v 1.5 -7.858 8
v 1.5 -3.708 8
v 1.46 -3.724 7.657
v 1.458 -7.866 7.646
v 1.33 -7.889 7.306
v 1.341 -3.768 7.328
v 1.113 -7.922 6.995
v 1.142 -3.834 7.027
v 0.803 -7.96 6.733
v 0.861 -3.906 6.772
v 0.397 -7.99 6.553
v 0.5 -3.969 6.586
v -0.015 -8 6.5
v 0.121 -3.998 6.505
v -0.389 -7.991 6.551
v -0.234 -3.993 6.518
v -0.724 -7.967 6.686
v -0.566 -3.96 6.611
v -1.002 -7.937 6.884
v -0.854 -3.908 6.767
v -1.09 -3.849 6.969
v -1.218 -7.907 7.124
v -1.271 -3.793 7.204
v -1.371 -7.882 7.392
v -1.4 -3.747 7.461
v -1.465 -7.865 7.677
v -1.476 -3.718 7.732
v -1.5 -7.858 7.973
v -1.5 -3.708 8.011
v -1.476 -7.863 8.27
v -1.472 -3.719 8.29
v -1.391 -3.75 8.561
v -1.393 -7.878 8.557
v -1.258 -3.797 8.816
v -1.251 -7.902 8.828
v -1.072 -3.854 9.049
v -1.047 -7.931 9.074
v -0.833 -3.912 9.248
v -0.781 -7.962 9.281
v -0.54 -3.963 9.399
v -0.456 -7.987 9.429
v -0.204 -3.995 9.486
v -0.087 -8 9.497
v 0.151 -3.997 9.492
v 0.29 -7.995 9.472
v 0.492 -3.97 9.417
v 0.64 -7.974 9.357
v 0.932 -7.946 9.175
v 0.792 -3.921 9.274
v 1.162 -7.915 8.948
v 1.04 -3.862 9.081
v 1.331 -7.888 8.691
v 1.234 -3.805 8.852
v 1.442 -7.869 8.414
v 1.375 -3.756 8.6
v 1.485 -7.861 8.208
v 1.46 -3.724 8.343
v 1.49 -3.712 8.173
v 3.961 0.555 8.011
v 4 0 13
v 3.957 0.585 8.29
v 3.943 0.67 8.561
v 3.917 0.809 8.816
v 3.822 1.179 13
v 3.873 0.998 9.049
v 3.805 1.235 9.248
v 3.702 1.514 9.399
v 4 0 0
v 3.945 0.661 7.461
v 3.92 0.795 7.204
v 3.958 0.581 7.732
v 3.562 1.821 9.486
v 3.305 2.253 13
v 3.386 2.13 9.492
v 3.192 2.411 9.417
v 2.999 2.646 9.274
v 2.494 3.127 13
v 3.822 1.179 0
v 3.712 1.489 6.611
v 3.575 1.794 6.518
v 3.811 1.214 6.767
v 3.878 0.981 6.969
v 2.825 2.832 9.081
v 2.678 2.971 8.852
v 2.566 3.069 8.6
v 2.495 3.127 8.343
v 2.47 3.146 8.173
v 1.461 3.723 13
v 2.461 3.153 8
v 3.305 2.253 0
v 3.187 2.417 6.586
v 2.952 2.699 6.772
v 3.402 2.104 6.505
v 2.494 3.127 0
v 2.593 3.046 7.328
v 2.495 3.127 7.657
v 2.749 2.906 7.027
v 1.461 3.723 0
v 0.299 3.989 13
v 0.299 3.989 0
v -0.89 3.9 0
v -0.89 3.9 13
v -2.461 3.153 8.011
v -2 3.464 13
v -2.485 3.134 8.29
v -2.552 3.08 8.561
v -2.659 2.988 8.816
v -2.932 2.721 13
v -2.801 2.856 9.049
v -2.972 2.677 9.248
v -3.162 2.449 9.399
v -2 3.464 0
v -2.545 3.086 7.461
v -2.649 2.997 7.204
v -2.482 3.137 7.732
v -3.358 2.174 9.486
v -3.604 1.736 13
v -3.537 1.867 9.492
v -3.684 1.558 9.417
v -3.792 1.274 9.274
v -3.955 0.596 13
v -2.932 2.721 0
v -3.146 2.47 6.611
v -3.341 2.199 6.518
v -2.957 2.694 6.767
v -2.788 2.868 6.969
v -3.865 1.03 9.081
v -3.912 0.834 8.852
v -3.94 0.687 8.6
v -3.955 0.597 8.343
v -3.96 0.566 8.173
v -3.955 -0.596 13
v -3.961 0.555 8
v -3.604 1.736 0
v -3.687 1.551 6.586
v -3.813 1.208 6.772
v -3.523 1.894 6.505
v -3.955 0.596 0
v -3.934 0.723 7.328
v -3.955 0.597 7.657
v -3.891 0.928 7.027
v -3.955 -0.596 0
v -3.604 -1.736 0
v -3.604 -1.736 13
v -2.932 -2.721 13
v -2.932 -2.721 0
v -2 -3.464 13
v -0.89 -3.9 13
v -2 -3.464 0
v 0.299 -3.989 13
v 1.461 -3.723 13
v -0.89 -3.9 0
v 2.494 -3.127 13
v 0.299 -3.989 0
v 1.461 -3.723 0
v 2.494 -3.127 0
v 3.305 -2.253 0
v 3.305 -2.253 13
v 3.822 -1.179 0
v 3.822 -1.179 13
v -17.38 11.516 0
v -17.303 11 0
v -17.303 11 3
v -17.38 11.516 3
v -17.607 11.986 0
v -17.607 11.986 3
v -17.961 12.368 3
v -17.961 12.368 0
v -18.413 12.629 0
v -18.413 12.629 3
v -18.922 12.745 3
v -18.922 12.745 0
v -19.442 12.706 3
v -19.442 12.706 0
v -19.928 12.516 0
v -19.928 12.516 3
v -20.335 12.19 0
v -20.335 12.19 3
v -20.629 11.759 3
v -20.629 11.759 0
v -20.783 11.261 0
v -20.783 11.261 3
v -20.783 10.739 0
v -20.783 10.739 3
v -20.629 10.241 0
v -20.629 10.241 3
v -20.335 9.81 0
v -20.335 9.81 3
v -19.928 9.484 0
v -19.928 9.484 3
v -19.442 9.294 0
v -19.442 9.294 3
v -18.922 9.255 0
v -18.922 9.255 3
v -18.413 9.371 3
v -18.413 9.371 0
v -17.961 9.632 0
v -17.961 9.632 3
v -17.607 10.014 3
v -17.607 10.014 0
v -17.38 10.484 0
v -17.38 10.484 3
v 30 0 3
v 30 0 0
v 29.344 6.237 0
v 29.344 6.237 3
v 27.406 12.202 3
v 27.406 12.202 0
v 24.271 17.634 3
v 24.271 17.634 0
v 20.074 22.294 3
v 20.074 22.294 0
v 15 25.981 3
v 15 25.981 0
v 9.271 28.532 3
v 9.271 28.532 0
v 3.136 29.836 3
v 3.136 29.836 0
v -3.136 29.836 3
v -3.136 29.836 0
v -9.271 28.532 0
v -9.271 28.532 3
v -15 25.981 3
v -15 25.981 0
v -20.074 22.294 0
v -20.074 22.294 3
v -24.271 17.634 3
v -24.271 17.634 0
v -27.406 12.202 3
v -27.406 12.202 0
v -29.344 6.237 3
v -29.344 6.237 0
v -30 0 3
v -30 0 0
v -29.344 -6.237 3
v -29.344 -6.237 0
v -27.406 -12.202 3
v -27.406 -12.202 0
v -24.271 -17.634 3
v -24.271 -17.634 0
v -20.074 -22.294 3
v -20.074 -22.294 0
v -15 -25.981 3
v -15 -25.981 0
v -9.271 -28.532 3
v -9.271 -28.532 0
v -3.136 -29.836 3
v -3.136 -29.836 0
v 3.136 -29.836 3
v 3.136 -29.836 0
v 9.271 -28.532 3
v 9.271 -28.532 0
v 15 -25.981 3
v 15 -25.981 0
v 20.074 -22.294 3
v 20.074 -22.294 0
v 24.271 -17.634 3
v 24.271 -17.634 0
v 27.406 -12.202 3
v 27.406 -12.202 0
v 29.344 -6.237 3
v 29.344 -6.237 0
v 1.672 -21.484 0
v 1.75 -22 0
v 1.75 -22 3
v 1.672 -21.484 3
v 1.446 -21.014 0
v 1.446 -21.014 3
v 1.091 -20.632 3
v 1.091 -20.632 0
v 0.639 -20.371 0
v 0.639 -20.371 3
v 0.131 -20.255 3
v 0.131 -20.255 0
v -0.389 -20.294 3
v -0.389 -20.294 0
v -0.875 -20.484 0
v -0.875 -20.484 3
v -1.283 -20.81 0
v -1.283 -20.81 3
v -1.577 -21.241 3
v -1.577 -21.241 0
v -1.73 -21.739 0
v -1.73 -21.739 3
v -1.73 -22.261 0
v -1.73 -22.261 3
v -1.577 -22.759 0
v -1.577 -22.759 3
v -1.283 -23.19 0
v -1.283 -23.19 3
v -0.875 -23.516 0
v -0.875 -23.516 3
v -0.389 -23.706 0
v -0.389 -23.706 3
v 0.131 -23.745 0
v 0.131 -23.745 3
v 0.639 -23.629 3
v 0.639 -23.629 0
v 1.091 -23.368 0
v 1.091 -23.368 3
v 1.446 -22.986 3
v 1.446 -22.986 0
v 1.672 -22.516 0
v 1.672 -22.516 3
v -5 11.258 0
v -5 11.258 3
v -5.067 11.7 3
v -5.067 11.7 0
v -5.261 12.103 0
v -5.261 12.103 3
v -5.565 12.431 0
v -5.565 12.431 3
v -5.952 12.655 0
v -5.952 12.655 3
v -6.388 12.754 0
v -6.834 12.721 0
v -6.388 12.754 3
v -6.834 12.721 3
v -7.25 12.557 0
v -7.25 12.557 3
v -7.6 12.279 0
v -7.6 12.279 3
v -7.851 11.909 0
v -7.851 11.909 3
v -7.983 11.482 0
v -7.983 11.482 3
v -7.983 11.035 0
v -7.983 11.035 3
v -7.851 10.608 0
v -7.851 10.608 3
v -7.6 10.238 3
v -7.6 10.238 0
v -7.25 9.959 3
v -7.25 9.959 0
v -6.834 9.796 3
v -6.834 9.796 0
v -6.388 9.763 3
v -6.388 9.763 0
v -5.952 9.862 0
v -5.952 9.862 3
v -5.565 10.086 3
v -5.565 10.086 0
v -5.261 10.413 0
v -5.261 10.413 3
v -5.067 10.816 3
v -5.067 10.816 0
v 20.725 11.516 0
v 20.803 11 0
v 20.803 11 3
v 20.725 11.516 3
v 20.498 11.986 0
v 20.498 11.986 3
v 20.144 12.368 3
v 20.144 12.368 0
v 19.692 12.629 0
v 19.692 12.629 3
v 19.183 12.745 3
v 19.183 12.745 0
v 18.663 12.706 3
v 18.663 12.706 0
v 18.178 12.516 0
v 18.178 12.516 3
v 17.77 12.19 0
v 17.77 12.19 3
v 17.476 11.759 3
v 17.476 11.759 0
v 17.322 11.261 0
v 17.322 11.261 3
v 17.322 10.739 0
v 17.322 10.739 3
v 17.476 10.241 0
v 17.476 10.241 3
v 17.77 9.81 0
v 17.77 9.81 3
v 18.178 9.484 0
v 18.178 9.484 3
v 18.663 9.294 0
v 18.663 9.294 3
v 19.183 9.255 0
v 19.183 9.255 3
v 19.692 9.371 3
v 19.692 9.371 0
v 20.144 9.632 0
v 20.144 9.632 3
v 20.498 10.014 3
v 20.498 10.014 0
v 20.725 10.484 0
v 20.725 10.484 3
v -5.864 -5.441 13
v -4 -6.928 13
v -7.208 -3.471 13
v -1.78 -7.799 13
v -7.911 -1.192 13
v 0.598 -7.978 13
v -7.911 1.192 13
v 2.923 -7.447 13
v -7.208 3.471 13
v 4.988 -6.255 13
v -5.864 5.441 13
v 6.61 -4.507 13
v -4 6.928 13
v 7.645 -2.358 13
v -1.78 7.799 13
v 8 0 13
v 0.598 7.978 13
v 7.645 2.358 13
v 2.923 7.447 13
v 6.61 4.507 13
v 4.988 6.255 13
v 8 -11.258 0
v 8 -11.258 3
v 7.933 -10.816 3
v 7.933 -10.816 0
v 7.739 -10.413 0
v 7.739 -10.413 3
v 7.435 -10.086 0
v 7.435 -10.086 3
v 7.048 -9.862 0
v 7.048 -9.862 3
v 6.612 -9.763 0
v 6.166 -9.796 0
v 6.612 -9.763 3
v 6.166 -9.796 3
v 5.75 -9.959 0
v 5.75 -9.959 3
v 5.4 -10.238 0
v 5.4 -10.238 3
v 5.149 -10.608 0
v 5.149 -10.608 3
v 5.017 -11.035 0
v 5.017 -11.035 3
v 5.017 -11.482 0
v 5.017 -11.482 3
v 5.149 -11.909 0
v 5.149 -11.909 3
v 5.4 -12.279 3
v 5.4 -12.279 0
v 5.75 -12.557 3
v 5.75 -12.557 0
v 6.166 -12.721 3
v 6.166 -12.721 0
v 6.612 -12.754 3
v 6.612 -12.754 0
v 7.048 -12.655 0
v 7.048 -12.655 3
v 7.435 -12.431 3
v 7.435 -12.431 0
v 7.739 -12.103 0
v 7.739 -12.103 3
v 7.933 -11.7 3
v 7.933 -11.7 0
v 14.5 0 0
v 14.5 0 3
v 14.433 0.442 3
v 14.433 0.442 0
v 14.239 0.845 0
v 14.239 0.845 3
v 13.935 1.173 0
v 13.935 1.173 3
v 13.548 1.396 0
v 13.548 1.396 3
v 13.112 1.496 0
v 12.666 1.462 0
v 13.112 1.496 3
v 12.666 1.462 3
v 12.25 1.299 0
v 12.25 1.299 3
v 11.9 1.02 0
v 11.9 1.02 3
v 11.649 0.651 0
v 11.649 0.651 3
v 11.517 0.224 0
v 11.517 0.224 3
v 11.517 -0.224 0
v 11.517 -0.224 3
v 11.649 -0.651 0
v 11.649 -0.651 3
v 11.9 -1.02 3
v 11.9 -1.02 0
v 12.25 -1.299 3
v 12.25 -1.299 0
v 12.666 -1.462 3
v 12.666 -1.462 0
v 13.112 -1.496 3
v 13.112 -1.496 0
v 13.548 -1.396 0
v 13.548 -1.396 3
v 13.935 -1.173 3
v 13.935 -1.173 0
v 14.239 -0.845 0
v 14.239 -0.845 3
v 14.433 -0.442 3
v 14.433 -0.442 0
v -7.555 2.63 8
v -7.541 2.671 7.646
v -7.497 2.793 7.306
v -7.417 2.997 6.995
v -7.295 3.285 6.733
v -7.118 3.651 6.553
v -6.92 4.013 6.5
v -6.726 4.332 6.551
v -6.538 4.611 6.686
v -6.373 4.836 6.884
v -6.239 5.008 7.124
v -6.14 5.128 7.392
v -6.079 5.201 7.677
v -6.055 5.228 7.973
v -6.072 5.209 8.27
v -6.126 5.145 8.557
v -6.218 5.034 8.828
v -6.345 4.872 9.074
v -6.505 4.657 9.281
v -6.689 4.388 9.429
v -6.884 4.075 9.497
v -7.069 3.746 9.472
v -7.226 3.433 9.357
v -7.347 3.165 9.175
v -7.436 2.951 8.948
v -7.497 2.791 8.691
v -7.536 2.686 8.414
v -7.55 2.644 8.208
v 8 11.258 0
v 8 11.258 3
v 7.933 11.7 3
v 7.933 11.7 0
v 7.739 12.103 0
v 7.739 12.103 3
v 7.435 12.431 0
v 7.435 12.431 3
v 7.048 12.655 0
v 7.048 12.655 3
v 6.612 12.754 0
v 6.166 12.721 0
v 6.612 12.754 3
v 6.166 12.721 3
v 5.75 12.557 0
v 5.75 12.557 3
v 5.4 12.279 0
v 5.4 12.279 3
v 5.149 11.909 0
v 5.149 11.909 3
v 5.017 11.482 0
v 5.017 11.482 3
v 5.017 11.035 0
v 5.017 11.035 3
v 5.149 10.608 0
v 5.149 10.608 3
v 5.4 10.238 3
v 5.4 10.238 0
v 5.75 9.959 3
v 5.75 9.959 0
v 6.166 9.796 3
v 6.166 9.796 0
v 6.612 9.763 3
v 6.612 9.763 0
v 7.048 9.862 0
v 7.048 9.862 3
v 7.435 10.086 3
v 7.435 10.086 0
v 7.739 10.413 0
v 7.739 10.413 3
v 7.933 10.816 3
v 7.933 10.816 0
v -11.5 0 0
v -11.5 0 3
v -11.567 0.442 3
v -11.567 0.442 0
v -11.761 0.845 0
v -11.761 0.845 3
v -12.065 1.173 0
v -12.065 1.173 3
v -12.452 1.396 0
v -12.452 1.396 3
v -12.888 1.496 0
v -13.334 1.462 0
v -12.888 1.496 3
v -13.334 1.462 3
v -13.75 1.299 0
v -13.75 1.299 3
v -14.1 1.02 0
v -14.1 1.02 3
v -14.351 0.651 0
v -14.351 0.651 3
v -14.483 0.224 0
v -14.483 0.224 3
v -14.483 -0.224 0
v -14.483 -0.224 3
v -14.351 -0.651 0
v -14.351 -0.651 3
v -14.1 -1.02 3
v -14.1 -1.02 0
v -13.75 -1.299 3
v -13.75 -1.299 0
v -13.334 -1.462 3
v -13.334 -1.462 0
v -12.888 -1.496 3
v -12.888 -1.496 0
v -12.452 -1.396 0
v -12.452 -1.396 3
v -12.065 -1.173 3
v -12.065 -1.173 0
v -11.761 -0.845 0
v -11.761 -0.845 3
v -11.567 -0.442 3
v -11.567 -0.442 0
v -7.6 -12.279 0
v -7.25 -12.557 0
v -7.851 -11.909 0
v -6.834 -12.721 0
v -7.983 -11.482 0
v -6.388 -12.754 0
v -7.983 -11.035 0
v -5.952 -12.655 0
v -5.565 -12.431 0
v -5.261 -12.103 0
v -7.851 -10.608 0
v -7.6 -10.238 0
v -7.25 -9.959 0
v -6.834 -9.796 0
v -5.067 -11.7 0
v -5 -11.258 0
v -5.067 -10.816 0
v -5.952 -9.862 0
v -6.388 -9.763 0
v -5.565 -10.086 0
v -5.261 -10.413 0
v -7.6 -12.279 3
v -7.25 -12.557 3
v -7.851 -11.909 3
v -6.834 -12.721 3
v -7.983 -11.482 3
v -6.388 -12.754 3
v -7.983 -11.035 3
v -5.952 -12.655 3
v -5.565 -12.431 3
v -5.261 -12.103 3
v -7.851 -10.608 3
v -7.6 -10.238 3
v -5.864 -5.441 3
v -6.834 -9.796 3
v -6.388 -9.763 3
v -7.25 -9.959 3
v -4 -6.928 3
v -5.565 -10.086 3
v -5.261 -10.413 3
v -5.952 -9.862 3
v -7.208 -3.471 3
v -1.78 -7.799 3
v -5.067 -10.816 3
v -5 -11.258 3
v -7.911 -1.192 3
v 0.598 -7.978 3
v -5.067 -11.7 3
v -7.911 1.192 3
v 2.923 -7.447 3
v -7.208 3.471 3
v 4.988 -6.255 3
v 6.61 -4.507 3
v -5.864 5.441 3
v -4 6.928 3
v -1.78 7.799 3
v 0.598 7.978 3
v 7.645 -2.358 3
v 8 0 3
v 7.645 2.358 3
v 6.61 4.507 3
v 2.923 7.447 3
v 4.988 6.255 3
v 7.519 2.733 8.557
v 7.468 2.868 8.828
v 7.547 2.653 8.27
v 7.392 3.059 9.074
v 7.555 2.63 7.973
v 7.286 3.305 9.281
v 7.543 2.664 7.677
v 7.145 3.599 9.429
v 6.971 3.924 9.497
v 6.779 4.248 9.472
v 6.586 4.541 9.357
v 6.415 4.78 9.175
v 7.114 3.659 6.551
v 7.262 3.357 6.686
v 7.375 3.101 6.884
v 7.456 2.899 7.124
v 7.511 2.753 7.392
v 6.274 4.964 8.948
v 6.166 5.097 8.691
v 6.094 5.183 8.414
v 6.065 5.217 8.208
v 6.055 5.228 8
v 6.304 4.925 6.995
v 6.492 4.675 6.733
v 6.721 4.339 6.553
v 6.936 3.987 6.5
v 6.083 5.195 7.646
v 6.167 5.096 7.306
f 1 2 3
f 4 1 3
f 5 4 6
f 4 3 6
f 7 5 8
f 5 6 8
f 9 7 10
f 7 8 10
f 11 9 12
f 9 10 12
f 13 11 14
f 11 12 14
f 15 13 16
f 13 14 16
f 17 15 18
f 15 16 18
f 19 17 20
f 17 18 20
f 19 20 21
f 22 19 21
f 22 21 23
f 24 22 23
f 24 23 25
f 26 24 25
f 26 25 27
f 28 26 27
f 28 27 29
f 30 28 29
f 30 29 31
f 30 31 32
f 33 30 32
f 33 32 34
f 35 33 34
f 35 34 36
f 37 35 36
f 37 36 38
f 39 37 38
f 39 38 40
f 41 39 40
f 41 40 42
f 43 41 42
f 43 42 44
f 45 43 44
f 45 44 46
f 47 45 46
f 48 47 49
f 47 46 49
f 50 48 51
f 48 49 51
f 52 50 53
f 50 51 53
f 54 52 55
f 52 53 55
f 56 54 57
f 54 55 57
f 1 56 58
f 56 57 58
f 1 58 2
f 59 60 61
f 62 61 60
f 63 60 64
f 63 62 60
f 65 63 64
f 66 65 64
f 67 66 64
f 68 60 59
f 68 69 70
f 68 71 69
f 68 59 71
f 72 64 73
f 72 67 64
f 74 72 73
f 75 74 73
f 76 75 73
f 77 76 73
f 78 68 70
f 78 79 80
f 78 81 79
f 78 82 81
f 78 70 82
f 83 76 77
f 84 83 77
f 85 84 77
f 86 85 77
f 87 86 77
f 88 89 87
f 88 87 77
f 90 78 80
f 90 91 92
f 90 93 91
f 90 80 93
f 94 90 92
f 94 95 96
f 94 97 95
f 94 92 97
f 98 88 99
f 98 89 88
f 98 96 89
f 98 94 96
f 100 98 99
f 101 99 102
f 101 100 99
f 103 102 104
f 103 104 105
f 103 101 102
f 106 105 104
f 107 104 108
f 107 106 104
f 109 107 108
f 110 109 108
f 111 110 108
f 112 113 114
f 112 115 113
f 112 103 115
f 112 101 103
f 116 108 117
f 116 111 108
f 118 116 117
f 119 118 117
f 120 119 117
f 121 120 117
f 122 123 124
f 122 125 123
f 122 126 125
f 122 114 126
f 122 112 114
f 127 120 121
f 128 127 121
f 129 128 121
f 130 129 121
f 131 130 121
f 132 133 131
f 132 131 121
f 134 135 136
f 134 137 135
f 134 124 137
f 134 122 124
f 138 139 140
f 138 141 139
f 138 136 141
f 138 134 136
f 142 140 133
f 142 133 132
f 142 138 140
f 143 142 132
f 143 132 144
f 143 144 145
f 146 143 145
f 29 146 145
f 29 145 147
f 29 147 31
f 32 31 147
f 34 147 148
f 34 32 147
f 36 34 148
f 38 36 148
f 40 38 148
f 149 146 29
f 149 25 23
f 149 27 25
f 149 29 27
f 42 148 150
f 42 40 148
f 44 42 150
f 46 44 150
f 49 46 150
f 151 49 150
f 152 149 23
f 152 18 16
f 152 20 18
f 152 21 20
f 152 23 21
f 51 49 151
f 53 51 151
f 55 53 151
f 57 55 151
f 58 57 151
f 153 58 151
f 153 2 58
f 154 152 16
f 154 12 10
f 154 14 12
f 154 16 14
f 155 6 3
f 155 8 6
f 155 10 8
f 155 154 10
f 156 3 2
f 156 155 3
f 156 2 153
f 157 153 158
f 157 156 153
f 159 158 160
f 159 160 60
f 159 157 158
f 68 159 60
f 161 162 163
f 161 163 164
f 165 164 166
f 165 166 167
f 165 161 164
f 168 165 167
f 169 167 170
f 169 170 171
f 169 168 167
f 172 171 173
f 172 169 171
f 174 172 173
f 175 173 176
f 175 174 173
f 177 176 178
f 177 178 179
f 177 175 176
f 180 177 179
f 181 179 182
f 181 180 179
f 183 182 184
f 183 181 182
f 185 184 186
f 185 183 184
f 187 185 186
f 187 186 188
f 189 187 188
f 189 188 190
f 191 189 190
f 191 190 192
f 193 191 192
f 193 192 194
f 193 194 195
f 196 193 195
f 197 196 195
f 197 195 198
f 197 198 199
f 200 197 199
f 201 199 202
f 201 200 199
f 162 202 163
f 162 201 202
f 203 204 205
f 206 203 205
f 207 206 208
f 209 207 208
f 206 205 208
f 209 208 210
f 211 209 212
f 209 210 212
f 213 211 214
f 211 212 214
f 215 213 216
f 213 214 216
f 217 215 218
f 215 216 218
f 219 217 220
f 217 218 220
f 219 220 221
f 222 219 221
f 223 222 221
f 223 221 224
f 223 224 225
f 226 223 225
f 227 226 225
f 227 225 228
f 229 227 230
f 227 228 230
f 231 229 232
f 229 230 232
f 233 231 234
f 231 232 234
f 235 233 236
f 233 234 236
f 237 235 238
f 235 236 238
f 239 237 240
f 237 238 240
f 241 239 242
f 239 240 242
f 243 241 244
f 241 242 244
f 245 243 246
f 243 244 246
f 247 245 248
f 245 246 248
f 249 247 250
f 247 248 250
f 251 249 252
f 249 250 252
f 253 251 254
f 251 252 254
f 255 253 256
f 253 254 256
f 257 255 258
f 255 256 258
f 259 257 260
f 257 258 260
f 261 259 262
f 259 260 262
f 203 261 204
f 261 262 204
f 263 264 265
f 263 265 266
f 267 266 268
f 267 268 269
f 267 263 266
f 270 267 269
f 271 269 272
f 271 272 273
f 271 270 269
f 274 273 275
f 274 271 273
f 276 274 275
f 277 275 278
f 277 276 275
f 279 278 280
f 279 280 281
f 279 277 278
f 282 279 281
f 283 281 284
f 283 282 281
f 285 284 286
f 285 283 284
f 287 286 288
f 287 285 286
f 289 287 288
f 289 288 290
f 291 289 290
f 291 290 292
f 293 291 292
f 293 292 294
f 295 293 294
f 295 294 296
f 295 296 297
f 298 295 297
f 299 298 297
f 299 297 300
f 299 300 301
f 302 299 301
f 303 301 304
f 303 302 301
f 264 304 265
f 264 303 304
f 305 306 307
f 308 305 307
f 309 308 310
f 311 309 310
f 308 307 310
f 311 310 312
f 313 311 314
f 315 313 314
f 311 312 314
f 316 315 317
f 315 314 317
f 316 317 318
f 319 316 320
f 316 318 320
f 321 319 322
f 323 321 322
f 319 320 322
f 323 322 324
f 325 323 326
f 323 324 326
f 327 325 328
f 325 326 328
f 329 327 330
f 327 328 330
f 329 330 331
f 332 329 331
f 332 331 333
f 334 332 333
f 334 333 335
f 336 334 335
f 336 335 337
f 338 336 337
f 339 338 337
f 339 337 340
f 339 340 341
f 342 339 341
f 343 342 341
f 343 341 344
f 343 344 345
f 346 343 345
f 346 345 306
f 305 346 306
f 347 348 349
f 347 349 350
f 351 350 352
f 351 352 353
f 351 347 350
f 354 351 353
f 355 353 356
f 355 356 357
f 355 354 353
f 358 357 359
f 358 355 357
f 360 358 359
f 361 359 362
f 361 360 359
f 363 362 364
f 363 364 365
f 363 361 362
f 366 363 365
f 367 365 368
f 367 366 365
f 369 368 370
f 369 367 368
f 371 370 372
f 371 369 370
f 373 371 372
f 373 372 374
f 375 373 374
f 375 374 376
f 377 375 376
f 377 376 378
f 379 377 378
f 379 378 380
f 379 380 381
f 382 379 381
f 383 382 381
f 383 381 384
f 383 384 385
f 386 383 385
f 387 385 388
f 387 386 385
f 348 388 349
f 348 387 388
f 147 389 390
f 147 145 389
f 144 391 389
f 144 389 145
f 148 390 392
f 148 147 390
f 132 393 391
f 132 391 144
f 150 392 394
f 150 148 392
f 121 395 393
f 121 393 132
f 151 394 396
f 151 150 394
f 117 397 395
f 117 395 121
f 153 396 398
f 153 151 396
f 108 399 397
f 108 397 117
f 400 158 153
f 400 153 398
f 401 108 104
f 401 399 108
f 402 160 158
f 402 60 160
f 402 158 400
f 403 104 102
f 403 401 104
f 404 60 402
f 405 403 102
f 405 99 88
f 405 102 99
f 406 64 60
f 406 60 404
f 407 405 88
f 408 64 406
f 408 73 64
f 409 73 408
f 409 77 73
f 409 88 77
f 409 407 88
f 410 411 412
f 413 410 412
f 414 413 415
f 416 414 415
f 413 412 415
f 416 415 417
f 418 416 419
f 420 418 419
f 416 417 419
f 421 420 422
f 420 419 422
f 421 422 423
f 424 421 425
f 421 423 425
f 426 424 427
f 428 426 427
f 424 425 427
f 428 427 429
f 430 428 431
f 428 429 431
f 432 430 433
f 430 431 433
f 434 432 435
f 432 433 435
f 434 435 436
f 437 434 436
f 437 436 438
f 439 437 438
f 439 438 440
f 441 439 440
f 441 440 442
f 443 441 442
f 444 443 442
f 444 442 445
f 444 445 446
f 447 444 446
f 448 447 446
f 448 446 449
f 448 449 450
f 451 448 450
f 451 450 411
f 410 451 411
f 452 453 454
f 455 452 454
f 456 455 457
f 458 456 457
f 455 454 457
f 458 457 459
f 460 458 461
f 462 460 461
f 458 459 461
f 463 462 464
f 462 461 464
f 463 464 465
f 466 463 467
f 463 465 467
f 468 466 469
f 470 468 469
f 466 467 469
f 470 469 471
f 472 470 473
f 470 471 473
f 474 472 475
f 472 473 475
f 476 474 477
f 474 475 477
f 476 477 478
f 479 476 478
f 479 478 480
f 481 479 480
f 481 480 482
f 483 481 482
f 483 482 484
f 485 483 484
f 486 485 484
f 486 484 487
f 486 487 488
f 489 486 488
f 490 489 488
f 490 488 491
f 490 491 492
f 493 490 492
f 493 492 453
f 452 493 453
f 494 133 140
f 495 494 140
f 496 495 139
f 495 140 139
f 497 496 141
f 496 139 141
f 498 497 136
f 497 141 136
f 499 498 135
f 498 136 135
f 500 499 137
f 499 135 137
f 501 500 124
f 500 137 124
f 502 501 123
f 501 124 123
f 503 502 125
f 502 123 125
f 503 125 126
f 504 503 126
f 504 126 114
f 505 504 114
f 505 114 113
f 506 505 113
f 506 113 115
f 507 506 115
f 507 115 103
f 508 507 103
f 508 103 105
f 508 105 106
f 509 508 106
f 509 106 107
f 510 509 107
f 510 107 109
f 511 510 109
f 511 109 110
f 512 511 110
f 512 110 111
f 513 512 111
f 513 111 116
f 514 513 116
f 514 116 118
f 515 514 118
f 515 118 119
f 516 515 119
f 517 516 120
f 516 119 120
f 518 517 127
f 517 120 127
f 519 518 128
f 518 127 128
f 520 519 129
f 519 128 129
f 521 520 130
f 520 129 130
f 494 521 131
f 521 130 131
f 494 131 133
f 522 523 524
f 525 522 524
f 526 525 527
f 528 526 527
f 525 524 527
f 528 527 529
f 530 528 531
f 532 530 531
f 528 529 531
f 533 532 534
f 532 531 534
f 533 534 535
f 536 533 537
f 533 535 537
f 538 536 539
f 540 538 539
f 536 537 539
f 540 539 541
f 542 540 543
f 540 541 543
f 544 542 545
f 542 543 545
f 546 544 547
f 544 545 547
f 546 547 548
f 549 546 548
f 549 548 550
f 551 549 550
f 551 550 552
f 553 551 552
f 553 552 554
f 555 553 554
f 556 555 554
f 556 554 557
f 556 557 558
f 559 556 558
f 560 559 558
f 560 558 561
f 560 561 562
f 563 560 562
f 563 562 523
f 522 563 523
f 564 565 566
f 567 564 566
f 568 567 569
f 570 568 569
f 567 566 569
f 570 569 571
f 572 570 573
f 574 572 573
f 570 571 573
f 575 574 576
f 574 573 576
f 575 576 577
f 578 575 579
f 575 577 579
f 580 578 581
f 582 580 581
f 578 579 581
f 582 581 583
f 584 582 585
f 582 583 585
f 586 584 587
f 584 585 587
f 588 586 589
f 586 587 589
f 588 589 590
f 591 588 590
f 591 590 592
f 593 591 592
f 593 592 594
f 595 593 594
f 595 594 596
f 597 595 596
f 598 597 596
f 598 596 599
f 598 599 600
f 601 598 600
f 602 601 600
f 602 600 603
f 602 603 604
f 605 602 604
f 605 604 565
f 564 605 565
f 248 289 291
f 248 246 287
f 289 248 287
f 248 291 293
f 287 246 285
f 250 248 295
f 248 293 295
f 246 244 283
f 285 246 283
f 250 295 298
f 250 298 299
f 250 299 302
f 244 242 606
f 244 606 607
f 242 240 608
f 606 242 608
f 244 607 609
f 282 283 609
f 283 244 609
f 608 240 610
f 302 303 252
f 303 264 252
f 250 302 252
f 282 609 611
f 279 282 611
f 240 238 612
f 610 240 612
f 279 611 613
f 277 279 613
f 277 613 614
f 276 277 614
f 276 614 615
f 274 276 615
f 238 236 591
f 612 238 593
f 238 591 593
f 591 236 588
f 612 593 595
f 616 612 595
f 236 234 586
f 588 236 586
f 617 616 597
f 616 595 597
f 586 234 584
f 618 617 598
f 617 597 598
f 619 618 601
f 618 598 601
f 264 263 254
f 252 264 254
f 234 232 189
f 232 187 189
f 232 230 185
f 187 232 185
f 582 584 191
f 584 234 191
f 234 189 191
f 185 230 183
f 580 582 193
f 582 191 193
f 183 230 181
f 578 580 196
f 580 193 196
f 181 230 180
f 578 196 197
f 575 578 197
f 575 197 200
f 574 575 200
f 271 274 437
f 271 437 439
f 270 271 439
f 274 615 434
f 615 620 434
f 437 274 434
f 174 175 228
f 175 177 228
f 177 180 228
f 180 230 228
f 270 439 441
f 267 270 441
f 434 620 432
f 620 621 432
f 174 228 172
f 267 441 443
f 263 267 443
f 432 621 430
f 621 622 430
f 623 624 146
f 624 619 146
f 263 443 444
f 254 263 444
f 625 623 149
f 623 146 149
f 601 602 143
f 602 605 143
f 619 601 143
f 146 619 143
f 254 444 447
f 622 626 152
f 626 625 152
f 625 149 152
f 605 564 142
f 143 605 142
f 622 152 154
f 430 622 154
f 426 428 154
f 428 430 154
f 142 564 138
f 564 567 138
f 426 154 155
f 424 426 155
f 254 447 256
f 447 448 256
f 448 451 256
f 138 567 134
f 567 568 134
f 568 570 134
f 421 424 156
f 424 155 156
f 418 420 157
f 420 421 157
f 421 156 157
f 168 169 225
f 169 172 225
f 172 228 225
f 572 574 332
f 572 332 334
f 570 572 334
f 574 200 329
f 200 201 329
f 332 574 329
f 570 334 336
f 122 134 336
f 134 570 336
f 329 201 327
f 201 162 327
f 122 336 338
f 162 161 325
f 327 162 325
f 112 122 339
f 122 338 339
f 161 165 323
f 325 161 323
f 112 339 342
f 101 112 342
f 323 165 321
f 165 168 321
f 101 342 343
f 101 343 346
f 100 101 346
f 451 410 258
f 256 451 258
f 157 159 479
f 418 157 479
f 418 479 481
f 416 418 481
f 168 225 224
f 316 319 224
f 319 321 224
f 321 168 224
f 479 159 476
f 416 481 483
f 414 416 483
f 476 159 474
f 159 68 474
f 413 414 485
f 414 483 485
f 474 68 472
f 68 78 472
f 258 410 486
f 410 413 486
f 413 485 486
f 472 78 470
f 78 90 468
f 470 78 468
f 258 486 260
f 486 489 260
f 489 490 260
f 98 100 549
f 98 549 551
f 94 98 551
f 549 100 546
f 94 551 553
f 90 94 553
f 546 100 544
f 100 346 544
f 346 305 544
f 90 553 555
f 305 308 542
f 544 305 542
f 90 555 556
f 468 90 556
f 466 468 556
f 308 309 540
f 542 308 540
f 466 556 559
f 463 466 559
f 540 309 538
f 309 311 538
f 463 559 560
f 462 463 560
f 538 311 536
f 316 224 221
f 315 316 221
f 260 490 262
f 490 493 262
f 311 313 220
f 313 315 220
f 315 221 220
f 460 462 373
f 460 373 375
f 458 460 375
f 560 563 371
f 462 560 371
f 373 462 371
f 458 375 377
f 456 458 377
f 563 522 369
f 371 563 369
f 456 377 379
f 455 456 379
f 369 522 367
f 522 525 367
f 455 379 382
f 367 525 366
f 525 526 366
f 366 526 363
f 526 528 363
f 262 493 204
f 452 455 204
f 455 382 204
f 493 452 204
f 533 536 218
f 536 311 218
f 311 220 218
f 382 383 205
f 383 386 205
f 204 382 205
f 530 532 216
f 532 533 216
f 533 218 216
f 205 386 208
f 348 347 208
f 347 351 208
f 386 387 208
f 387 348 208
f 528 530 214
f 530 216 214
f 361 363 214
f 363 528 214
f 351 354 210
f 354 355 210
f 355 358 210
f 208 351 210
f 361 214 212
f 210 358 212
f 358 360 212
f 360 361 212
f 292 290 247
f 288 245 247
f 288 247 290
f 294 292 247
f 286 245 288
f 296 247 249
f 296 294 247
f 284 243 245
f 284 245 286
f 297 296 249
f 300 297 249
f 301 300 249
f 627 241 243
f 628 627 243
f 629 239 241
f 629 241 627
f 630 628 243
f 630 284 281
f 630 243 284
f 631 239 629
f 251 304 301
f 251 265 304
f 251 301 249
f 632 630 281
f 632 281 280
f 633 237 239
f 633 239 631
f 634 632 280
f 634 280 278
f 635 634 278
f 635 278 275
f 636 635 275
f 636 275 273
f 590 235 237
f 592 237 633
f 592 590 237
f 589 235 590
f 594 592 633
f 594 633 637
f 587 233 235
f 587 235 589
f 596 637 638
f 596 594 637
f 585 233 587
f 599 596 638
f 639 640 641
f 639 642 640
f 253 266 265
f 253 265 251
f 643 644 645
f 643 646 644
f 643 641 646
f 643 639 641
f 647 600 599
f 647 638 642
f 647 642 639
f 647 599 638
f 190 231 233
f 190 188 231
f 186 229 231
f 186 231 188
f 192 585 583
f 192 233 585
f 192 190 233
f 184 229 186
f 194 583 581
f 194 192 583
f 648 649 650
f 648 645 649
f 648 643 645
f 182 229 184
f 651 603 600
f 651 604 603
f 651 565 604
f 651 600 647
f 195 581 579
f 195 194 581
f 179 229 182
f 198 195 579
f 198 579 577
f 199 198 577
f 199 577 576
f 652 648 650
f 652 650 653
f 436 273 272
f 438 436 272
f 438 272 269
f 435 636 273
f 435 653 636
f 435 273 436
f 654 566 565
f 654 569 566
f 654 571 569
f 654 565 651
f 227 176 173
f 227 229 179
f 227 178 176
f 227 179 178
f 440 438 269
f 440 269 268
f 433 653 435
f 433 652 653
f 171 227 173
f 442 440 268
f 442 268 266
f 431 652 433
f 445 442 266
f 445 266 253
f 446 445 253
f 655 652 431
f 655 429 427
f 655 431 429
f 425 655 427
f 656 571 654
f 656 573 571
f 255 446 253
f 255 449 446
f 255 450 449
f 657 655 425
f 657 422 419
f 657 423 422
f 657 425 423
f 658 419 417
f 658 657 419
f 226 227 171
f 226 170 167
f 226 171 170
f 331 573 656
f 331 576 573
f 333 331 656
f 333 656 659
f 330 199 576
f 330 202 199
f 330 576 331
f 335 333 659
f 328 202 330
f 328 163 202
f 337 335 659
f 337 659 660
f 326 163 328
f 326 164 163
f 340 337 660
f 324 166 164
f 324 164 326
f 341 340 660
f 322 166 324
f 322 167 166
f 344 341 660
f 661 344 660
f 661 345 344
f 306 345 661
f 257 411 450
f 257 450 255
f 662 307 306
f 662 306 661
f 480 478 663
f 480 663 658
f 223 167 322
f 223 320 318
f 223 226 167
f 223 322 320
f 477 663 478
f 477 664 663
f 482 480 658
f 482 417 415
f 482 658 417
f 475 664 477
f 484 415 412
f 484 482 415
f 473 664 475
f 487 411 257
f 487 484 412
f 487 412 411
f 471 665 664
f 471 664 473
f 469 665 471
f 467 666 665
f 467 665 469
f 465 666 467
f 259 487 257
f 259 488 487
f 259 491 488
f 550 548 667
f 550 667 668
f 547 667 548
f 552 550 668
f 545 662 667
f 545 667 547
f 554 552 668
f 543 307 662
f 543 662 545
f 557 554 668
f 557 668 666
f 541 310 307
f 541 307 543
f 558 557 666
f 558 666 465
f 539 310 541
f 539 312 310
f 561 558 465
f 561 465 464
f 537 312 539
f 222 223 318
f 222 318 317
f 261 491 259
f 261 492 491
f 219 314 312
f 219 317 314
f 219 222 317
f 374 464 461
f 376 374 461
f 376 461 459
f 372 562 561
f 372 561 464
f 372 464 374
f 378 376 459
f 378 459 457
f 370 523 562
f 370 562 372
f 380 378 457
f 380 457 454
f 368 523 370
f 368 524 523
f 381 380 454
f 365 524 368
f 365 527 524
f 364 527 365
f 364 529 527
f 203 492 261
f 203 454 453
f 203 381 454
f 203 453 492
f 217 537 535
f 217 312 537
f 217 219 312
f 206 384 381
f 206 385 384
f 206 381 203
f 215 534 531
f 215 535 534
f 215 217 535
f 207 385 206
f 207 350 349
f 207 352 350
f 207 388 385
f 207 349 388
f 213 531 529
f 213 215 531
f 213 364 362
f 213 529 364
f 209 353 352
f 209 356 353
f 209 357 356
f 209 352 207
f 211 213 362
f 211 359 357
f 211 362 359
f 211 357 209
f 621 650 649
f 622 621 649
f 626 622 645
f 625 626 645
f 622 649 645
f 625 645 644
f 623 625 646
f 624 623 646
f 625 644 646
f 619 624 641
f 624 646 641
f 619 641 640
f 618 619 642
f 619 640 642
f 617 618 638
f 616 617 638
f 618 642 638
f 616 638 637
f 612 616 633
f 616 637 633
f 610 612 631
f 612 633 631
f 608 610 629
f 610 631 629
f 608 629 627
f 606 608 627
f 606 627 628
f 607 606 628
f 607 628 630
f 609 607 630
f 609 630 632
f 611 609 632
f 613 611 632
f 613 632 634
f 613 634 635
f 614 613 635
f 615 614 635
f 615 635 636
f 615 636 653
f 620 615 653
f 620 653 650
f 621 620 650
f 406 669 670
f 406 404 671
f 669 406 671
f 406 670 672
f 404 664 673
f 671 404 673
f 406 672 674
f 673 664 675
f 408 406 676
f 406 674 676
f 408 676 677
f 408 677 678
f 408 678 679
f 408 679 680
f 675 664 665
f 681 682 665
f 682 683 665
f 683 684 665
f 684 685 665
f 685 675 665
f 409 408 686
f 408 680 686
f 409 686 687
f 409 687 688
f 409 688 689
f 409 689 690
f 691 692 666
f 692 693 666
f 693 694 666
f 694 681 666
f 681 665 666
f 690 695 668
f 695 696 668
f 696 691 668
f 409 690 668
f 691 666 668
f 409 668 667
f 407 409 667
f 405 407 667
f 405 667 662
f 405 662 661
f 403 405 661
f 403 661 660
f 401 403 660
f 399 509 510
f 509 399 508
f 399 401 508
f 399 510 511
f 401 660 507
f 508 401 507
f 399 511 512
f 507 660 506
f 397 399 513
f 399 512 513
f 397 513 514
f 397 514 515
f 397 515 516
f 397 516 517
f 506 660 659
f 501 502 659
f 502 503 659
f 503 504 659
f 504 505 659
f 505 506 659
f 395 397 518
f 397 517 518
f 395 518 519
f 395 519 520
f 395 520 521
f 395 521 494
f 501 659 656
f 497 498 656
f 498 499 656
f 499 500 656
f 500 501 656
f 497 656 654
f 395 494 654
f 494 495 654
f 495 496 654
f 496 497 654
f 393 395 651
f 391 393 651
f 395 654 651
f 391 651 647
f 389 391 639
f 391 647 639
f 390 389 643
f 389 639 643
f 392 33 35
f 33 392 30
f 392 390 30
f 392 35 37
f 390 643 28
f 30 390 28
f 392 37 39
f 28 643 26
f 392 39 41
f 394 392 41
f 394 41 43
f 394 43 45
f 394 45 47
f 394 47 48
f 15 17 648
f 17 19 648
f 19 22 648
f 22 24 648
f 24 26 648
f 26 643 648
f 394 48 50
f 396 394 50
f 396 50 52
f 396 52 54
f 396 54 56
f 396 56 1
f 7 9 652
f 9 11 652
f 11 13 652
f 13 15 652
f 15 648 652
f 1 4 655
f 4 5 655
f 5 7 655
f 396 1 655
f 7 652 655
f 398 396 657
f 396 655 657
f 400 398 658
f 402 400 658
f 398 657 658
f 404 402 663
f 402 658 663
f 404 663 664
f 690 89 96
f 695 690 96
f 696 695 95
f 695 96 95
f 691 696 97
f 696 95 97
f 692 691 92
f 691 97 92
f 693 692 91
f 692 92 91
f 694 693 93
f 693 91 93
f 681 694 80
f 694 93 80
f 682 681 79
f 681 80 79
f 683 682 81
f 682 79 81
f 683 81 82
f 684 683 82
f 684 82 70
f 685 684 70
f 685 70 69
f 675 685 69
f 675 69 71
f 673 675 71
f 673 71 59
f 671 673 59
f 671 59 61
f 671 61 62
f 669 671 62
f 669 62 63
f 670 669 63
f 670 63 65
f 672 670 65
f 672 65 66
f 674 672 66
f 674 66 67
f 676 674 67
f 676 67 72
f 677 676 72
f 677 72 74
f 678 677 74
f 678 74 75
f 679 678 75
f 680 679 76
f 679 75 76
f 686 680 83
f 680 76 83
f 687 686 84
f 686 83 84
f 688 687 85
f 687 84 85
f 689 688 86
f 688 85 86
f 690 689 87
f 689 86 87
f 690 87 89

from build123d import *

# Parameters (mm, degrees)
SKETCH2_R           = 30
SKETCH2_R_2         = 4
SKETCH2_R_3         = 1.75
BOSS_EXTRUDE1_DEPTH = 3
SKETCH3_R           = 8
SKETCH3_R_2         = 4
BOSS_EXTRUDE2_DEPTH = 10
SKETCH4_R           = 1.5
CUT_EXTRUDE2_DEPTH  = 4
SKETCH12_R          = 1.5
CUT_EXTRUDE3_DEPTH  = 11.49377522
CIRPATTERN1_COUNT   = 3


with BuildPart() as part:
    # Sketch2 → Boss-Extrude1 (new body)
    with BuildSketch(Plane.XY):
        Circle(SKETCH2_R)
        Circle(SKETCH2_R_2, mode=Mode.SUBTRACT)
        with Locations((0, -22)):
            Circle(SKETCH2_R_3, mode=Mode.SUBTRACT)
        with Locations((-19.052558883, 11)):
            Circle(SKETCH2_R_3, mode=Mode.SUBTRACT)
        with Locations((19.052558883, 11)):
            Circle(SKETCH2_R_3, mode=Mode.SUBTRACT)
    extrude(amount=BOSS_EXTRUDE1_DEPTH)

    # Sketch3 → Boss-Extrude2 (add)
    with BuildSketch(Plane.XY.offset(3)):
        Circle(SKETCH3_R)
        Circle(SKETCH3_R_2, mode=Mode.SUBTRACT)
    extrude(amount=BOSS_EXTRUDE2_DEPTH)

    # Sketch4 → Cut-Extrude2 (cut, through all)
    with BuildSketch(Plane.XY.offset(3)):
        with Locations((-6.5, 11.258330249)):
            Circle(SKETCH4_R)
        with Locations((13, 0)):
            Circle(SKETCH4_R)
        with Locations((-6.5, -11.258330249)):
            Circle(SKETCH4_R)
        with Locations((6.5, 11.258330249)):
            Circle(SKETCH4_R)
        with Locations((6.5, -11.258330249)):
            Circle(SKETCH4_R)
        with Locations((-13, 0)):
            Circle(SKETCH4_R)
    extrude(amount=-CUT_EXTRUDE2_DEPTH, mode=Mode.SUBTRACT)

    # Sketch12 → Cut-Extrude3 (cut)
    with BuildSketch(Plane(origin=(0, 0, 0), x_dir=(1, 0, 0), z_dir=(0, 1, 0))):
        with Locations((0, -8)):
            Circle(SKETCH12_R)
    cut_extrude3 = extrude(amount=-CUT_EXTRUDE3_DEPTH, mode=Mode.SUBTRACT)

    # CirPattern1: Cut-Extrude3 ×3 about axis
    cirpattern1_axis = Axis((0, 0, 0), (0, 0, -1))
    for i in range(1, CIRPATTERN1_COUNT):
        add(cut_extrude3.rotate(cirpattern1_axis, i * 360 / CIRPATTERN1_COUNT), mode=Mode.SUBTRACT)


solid = part.part
